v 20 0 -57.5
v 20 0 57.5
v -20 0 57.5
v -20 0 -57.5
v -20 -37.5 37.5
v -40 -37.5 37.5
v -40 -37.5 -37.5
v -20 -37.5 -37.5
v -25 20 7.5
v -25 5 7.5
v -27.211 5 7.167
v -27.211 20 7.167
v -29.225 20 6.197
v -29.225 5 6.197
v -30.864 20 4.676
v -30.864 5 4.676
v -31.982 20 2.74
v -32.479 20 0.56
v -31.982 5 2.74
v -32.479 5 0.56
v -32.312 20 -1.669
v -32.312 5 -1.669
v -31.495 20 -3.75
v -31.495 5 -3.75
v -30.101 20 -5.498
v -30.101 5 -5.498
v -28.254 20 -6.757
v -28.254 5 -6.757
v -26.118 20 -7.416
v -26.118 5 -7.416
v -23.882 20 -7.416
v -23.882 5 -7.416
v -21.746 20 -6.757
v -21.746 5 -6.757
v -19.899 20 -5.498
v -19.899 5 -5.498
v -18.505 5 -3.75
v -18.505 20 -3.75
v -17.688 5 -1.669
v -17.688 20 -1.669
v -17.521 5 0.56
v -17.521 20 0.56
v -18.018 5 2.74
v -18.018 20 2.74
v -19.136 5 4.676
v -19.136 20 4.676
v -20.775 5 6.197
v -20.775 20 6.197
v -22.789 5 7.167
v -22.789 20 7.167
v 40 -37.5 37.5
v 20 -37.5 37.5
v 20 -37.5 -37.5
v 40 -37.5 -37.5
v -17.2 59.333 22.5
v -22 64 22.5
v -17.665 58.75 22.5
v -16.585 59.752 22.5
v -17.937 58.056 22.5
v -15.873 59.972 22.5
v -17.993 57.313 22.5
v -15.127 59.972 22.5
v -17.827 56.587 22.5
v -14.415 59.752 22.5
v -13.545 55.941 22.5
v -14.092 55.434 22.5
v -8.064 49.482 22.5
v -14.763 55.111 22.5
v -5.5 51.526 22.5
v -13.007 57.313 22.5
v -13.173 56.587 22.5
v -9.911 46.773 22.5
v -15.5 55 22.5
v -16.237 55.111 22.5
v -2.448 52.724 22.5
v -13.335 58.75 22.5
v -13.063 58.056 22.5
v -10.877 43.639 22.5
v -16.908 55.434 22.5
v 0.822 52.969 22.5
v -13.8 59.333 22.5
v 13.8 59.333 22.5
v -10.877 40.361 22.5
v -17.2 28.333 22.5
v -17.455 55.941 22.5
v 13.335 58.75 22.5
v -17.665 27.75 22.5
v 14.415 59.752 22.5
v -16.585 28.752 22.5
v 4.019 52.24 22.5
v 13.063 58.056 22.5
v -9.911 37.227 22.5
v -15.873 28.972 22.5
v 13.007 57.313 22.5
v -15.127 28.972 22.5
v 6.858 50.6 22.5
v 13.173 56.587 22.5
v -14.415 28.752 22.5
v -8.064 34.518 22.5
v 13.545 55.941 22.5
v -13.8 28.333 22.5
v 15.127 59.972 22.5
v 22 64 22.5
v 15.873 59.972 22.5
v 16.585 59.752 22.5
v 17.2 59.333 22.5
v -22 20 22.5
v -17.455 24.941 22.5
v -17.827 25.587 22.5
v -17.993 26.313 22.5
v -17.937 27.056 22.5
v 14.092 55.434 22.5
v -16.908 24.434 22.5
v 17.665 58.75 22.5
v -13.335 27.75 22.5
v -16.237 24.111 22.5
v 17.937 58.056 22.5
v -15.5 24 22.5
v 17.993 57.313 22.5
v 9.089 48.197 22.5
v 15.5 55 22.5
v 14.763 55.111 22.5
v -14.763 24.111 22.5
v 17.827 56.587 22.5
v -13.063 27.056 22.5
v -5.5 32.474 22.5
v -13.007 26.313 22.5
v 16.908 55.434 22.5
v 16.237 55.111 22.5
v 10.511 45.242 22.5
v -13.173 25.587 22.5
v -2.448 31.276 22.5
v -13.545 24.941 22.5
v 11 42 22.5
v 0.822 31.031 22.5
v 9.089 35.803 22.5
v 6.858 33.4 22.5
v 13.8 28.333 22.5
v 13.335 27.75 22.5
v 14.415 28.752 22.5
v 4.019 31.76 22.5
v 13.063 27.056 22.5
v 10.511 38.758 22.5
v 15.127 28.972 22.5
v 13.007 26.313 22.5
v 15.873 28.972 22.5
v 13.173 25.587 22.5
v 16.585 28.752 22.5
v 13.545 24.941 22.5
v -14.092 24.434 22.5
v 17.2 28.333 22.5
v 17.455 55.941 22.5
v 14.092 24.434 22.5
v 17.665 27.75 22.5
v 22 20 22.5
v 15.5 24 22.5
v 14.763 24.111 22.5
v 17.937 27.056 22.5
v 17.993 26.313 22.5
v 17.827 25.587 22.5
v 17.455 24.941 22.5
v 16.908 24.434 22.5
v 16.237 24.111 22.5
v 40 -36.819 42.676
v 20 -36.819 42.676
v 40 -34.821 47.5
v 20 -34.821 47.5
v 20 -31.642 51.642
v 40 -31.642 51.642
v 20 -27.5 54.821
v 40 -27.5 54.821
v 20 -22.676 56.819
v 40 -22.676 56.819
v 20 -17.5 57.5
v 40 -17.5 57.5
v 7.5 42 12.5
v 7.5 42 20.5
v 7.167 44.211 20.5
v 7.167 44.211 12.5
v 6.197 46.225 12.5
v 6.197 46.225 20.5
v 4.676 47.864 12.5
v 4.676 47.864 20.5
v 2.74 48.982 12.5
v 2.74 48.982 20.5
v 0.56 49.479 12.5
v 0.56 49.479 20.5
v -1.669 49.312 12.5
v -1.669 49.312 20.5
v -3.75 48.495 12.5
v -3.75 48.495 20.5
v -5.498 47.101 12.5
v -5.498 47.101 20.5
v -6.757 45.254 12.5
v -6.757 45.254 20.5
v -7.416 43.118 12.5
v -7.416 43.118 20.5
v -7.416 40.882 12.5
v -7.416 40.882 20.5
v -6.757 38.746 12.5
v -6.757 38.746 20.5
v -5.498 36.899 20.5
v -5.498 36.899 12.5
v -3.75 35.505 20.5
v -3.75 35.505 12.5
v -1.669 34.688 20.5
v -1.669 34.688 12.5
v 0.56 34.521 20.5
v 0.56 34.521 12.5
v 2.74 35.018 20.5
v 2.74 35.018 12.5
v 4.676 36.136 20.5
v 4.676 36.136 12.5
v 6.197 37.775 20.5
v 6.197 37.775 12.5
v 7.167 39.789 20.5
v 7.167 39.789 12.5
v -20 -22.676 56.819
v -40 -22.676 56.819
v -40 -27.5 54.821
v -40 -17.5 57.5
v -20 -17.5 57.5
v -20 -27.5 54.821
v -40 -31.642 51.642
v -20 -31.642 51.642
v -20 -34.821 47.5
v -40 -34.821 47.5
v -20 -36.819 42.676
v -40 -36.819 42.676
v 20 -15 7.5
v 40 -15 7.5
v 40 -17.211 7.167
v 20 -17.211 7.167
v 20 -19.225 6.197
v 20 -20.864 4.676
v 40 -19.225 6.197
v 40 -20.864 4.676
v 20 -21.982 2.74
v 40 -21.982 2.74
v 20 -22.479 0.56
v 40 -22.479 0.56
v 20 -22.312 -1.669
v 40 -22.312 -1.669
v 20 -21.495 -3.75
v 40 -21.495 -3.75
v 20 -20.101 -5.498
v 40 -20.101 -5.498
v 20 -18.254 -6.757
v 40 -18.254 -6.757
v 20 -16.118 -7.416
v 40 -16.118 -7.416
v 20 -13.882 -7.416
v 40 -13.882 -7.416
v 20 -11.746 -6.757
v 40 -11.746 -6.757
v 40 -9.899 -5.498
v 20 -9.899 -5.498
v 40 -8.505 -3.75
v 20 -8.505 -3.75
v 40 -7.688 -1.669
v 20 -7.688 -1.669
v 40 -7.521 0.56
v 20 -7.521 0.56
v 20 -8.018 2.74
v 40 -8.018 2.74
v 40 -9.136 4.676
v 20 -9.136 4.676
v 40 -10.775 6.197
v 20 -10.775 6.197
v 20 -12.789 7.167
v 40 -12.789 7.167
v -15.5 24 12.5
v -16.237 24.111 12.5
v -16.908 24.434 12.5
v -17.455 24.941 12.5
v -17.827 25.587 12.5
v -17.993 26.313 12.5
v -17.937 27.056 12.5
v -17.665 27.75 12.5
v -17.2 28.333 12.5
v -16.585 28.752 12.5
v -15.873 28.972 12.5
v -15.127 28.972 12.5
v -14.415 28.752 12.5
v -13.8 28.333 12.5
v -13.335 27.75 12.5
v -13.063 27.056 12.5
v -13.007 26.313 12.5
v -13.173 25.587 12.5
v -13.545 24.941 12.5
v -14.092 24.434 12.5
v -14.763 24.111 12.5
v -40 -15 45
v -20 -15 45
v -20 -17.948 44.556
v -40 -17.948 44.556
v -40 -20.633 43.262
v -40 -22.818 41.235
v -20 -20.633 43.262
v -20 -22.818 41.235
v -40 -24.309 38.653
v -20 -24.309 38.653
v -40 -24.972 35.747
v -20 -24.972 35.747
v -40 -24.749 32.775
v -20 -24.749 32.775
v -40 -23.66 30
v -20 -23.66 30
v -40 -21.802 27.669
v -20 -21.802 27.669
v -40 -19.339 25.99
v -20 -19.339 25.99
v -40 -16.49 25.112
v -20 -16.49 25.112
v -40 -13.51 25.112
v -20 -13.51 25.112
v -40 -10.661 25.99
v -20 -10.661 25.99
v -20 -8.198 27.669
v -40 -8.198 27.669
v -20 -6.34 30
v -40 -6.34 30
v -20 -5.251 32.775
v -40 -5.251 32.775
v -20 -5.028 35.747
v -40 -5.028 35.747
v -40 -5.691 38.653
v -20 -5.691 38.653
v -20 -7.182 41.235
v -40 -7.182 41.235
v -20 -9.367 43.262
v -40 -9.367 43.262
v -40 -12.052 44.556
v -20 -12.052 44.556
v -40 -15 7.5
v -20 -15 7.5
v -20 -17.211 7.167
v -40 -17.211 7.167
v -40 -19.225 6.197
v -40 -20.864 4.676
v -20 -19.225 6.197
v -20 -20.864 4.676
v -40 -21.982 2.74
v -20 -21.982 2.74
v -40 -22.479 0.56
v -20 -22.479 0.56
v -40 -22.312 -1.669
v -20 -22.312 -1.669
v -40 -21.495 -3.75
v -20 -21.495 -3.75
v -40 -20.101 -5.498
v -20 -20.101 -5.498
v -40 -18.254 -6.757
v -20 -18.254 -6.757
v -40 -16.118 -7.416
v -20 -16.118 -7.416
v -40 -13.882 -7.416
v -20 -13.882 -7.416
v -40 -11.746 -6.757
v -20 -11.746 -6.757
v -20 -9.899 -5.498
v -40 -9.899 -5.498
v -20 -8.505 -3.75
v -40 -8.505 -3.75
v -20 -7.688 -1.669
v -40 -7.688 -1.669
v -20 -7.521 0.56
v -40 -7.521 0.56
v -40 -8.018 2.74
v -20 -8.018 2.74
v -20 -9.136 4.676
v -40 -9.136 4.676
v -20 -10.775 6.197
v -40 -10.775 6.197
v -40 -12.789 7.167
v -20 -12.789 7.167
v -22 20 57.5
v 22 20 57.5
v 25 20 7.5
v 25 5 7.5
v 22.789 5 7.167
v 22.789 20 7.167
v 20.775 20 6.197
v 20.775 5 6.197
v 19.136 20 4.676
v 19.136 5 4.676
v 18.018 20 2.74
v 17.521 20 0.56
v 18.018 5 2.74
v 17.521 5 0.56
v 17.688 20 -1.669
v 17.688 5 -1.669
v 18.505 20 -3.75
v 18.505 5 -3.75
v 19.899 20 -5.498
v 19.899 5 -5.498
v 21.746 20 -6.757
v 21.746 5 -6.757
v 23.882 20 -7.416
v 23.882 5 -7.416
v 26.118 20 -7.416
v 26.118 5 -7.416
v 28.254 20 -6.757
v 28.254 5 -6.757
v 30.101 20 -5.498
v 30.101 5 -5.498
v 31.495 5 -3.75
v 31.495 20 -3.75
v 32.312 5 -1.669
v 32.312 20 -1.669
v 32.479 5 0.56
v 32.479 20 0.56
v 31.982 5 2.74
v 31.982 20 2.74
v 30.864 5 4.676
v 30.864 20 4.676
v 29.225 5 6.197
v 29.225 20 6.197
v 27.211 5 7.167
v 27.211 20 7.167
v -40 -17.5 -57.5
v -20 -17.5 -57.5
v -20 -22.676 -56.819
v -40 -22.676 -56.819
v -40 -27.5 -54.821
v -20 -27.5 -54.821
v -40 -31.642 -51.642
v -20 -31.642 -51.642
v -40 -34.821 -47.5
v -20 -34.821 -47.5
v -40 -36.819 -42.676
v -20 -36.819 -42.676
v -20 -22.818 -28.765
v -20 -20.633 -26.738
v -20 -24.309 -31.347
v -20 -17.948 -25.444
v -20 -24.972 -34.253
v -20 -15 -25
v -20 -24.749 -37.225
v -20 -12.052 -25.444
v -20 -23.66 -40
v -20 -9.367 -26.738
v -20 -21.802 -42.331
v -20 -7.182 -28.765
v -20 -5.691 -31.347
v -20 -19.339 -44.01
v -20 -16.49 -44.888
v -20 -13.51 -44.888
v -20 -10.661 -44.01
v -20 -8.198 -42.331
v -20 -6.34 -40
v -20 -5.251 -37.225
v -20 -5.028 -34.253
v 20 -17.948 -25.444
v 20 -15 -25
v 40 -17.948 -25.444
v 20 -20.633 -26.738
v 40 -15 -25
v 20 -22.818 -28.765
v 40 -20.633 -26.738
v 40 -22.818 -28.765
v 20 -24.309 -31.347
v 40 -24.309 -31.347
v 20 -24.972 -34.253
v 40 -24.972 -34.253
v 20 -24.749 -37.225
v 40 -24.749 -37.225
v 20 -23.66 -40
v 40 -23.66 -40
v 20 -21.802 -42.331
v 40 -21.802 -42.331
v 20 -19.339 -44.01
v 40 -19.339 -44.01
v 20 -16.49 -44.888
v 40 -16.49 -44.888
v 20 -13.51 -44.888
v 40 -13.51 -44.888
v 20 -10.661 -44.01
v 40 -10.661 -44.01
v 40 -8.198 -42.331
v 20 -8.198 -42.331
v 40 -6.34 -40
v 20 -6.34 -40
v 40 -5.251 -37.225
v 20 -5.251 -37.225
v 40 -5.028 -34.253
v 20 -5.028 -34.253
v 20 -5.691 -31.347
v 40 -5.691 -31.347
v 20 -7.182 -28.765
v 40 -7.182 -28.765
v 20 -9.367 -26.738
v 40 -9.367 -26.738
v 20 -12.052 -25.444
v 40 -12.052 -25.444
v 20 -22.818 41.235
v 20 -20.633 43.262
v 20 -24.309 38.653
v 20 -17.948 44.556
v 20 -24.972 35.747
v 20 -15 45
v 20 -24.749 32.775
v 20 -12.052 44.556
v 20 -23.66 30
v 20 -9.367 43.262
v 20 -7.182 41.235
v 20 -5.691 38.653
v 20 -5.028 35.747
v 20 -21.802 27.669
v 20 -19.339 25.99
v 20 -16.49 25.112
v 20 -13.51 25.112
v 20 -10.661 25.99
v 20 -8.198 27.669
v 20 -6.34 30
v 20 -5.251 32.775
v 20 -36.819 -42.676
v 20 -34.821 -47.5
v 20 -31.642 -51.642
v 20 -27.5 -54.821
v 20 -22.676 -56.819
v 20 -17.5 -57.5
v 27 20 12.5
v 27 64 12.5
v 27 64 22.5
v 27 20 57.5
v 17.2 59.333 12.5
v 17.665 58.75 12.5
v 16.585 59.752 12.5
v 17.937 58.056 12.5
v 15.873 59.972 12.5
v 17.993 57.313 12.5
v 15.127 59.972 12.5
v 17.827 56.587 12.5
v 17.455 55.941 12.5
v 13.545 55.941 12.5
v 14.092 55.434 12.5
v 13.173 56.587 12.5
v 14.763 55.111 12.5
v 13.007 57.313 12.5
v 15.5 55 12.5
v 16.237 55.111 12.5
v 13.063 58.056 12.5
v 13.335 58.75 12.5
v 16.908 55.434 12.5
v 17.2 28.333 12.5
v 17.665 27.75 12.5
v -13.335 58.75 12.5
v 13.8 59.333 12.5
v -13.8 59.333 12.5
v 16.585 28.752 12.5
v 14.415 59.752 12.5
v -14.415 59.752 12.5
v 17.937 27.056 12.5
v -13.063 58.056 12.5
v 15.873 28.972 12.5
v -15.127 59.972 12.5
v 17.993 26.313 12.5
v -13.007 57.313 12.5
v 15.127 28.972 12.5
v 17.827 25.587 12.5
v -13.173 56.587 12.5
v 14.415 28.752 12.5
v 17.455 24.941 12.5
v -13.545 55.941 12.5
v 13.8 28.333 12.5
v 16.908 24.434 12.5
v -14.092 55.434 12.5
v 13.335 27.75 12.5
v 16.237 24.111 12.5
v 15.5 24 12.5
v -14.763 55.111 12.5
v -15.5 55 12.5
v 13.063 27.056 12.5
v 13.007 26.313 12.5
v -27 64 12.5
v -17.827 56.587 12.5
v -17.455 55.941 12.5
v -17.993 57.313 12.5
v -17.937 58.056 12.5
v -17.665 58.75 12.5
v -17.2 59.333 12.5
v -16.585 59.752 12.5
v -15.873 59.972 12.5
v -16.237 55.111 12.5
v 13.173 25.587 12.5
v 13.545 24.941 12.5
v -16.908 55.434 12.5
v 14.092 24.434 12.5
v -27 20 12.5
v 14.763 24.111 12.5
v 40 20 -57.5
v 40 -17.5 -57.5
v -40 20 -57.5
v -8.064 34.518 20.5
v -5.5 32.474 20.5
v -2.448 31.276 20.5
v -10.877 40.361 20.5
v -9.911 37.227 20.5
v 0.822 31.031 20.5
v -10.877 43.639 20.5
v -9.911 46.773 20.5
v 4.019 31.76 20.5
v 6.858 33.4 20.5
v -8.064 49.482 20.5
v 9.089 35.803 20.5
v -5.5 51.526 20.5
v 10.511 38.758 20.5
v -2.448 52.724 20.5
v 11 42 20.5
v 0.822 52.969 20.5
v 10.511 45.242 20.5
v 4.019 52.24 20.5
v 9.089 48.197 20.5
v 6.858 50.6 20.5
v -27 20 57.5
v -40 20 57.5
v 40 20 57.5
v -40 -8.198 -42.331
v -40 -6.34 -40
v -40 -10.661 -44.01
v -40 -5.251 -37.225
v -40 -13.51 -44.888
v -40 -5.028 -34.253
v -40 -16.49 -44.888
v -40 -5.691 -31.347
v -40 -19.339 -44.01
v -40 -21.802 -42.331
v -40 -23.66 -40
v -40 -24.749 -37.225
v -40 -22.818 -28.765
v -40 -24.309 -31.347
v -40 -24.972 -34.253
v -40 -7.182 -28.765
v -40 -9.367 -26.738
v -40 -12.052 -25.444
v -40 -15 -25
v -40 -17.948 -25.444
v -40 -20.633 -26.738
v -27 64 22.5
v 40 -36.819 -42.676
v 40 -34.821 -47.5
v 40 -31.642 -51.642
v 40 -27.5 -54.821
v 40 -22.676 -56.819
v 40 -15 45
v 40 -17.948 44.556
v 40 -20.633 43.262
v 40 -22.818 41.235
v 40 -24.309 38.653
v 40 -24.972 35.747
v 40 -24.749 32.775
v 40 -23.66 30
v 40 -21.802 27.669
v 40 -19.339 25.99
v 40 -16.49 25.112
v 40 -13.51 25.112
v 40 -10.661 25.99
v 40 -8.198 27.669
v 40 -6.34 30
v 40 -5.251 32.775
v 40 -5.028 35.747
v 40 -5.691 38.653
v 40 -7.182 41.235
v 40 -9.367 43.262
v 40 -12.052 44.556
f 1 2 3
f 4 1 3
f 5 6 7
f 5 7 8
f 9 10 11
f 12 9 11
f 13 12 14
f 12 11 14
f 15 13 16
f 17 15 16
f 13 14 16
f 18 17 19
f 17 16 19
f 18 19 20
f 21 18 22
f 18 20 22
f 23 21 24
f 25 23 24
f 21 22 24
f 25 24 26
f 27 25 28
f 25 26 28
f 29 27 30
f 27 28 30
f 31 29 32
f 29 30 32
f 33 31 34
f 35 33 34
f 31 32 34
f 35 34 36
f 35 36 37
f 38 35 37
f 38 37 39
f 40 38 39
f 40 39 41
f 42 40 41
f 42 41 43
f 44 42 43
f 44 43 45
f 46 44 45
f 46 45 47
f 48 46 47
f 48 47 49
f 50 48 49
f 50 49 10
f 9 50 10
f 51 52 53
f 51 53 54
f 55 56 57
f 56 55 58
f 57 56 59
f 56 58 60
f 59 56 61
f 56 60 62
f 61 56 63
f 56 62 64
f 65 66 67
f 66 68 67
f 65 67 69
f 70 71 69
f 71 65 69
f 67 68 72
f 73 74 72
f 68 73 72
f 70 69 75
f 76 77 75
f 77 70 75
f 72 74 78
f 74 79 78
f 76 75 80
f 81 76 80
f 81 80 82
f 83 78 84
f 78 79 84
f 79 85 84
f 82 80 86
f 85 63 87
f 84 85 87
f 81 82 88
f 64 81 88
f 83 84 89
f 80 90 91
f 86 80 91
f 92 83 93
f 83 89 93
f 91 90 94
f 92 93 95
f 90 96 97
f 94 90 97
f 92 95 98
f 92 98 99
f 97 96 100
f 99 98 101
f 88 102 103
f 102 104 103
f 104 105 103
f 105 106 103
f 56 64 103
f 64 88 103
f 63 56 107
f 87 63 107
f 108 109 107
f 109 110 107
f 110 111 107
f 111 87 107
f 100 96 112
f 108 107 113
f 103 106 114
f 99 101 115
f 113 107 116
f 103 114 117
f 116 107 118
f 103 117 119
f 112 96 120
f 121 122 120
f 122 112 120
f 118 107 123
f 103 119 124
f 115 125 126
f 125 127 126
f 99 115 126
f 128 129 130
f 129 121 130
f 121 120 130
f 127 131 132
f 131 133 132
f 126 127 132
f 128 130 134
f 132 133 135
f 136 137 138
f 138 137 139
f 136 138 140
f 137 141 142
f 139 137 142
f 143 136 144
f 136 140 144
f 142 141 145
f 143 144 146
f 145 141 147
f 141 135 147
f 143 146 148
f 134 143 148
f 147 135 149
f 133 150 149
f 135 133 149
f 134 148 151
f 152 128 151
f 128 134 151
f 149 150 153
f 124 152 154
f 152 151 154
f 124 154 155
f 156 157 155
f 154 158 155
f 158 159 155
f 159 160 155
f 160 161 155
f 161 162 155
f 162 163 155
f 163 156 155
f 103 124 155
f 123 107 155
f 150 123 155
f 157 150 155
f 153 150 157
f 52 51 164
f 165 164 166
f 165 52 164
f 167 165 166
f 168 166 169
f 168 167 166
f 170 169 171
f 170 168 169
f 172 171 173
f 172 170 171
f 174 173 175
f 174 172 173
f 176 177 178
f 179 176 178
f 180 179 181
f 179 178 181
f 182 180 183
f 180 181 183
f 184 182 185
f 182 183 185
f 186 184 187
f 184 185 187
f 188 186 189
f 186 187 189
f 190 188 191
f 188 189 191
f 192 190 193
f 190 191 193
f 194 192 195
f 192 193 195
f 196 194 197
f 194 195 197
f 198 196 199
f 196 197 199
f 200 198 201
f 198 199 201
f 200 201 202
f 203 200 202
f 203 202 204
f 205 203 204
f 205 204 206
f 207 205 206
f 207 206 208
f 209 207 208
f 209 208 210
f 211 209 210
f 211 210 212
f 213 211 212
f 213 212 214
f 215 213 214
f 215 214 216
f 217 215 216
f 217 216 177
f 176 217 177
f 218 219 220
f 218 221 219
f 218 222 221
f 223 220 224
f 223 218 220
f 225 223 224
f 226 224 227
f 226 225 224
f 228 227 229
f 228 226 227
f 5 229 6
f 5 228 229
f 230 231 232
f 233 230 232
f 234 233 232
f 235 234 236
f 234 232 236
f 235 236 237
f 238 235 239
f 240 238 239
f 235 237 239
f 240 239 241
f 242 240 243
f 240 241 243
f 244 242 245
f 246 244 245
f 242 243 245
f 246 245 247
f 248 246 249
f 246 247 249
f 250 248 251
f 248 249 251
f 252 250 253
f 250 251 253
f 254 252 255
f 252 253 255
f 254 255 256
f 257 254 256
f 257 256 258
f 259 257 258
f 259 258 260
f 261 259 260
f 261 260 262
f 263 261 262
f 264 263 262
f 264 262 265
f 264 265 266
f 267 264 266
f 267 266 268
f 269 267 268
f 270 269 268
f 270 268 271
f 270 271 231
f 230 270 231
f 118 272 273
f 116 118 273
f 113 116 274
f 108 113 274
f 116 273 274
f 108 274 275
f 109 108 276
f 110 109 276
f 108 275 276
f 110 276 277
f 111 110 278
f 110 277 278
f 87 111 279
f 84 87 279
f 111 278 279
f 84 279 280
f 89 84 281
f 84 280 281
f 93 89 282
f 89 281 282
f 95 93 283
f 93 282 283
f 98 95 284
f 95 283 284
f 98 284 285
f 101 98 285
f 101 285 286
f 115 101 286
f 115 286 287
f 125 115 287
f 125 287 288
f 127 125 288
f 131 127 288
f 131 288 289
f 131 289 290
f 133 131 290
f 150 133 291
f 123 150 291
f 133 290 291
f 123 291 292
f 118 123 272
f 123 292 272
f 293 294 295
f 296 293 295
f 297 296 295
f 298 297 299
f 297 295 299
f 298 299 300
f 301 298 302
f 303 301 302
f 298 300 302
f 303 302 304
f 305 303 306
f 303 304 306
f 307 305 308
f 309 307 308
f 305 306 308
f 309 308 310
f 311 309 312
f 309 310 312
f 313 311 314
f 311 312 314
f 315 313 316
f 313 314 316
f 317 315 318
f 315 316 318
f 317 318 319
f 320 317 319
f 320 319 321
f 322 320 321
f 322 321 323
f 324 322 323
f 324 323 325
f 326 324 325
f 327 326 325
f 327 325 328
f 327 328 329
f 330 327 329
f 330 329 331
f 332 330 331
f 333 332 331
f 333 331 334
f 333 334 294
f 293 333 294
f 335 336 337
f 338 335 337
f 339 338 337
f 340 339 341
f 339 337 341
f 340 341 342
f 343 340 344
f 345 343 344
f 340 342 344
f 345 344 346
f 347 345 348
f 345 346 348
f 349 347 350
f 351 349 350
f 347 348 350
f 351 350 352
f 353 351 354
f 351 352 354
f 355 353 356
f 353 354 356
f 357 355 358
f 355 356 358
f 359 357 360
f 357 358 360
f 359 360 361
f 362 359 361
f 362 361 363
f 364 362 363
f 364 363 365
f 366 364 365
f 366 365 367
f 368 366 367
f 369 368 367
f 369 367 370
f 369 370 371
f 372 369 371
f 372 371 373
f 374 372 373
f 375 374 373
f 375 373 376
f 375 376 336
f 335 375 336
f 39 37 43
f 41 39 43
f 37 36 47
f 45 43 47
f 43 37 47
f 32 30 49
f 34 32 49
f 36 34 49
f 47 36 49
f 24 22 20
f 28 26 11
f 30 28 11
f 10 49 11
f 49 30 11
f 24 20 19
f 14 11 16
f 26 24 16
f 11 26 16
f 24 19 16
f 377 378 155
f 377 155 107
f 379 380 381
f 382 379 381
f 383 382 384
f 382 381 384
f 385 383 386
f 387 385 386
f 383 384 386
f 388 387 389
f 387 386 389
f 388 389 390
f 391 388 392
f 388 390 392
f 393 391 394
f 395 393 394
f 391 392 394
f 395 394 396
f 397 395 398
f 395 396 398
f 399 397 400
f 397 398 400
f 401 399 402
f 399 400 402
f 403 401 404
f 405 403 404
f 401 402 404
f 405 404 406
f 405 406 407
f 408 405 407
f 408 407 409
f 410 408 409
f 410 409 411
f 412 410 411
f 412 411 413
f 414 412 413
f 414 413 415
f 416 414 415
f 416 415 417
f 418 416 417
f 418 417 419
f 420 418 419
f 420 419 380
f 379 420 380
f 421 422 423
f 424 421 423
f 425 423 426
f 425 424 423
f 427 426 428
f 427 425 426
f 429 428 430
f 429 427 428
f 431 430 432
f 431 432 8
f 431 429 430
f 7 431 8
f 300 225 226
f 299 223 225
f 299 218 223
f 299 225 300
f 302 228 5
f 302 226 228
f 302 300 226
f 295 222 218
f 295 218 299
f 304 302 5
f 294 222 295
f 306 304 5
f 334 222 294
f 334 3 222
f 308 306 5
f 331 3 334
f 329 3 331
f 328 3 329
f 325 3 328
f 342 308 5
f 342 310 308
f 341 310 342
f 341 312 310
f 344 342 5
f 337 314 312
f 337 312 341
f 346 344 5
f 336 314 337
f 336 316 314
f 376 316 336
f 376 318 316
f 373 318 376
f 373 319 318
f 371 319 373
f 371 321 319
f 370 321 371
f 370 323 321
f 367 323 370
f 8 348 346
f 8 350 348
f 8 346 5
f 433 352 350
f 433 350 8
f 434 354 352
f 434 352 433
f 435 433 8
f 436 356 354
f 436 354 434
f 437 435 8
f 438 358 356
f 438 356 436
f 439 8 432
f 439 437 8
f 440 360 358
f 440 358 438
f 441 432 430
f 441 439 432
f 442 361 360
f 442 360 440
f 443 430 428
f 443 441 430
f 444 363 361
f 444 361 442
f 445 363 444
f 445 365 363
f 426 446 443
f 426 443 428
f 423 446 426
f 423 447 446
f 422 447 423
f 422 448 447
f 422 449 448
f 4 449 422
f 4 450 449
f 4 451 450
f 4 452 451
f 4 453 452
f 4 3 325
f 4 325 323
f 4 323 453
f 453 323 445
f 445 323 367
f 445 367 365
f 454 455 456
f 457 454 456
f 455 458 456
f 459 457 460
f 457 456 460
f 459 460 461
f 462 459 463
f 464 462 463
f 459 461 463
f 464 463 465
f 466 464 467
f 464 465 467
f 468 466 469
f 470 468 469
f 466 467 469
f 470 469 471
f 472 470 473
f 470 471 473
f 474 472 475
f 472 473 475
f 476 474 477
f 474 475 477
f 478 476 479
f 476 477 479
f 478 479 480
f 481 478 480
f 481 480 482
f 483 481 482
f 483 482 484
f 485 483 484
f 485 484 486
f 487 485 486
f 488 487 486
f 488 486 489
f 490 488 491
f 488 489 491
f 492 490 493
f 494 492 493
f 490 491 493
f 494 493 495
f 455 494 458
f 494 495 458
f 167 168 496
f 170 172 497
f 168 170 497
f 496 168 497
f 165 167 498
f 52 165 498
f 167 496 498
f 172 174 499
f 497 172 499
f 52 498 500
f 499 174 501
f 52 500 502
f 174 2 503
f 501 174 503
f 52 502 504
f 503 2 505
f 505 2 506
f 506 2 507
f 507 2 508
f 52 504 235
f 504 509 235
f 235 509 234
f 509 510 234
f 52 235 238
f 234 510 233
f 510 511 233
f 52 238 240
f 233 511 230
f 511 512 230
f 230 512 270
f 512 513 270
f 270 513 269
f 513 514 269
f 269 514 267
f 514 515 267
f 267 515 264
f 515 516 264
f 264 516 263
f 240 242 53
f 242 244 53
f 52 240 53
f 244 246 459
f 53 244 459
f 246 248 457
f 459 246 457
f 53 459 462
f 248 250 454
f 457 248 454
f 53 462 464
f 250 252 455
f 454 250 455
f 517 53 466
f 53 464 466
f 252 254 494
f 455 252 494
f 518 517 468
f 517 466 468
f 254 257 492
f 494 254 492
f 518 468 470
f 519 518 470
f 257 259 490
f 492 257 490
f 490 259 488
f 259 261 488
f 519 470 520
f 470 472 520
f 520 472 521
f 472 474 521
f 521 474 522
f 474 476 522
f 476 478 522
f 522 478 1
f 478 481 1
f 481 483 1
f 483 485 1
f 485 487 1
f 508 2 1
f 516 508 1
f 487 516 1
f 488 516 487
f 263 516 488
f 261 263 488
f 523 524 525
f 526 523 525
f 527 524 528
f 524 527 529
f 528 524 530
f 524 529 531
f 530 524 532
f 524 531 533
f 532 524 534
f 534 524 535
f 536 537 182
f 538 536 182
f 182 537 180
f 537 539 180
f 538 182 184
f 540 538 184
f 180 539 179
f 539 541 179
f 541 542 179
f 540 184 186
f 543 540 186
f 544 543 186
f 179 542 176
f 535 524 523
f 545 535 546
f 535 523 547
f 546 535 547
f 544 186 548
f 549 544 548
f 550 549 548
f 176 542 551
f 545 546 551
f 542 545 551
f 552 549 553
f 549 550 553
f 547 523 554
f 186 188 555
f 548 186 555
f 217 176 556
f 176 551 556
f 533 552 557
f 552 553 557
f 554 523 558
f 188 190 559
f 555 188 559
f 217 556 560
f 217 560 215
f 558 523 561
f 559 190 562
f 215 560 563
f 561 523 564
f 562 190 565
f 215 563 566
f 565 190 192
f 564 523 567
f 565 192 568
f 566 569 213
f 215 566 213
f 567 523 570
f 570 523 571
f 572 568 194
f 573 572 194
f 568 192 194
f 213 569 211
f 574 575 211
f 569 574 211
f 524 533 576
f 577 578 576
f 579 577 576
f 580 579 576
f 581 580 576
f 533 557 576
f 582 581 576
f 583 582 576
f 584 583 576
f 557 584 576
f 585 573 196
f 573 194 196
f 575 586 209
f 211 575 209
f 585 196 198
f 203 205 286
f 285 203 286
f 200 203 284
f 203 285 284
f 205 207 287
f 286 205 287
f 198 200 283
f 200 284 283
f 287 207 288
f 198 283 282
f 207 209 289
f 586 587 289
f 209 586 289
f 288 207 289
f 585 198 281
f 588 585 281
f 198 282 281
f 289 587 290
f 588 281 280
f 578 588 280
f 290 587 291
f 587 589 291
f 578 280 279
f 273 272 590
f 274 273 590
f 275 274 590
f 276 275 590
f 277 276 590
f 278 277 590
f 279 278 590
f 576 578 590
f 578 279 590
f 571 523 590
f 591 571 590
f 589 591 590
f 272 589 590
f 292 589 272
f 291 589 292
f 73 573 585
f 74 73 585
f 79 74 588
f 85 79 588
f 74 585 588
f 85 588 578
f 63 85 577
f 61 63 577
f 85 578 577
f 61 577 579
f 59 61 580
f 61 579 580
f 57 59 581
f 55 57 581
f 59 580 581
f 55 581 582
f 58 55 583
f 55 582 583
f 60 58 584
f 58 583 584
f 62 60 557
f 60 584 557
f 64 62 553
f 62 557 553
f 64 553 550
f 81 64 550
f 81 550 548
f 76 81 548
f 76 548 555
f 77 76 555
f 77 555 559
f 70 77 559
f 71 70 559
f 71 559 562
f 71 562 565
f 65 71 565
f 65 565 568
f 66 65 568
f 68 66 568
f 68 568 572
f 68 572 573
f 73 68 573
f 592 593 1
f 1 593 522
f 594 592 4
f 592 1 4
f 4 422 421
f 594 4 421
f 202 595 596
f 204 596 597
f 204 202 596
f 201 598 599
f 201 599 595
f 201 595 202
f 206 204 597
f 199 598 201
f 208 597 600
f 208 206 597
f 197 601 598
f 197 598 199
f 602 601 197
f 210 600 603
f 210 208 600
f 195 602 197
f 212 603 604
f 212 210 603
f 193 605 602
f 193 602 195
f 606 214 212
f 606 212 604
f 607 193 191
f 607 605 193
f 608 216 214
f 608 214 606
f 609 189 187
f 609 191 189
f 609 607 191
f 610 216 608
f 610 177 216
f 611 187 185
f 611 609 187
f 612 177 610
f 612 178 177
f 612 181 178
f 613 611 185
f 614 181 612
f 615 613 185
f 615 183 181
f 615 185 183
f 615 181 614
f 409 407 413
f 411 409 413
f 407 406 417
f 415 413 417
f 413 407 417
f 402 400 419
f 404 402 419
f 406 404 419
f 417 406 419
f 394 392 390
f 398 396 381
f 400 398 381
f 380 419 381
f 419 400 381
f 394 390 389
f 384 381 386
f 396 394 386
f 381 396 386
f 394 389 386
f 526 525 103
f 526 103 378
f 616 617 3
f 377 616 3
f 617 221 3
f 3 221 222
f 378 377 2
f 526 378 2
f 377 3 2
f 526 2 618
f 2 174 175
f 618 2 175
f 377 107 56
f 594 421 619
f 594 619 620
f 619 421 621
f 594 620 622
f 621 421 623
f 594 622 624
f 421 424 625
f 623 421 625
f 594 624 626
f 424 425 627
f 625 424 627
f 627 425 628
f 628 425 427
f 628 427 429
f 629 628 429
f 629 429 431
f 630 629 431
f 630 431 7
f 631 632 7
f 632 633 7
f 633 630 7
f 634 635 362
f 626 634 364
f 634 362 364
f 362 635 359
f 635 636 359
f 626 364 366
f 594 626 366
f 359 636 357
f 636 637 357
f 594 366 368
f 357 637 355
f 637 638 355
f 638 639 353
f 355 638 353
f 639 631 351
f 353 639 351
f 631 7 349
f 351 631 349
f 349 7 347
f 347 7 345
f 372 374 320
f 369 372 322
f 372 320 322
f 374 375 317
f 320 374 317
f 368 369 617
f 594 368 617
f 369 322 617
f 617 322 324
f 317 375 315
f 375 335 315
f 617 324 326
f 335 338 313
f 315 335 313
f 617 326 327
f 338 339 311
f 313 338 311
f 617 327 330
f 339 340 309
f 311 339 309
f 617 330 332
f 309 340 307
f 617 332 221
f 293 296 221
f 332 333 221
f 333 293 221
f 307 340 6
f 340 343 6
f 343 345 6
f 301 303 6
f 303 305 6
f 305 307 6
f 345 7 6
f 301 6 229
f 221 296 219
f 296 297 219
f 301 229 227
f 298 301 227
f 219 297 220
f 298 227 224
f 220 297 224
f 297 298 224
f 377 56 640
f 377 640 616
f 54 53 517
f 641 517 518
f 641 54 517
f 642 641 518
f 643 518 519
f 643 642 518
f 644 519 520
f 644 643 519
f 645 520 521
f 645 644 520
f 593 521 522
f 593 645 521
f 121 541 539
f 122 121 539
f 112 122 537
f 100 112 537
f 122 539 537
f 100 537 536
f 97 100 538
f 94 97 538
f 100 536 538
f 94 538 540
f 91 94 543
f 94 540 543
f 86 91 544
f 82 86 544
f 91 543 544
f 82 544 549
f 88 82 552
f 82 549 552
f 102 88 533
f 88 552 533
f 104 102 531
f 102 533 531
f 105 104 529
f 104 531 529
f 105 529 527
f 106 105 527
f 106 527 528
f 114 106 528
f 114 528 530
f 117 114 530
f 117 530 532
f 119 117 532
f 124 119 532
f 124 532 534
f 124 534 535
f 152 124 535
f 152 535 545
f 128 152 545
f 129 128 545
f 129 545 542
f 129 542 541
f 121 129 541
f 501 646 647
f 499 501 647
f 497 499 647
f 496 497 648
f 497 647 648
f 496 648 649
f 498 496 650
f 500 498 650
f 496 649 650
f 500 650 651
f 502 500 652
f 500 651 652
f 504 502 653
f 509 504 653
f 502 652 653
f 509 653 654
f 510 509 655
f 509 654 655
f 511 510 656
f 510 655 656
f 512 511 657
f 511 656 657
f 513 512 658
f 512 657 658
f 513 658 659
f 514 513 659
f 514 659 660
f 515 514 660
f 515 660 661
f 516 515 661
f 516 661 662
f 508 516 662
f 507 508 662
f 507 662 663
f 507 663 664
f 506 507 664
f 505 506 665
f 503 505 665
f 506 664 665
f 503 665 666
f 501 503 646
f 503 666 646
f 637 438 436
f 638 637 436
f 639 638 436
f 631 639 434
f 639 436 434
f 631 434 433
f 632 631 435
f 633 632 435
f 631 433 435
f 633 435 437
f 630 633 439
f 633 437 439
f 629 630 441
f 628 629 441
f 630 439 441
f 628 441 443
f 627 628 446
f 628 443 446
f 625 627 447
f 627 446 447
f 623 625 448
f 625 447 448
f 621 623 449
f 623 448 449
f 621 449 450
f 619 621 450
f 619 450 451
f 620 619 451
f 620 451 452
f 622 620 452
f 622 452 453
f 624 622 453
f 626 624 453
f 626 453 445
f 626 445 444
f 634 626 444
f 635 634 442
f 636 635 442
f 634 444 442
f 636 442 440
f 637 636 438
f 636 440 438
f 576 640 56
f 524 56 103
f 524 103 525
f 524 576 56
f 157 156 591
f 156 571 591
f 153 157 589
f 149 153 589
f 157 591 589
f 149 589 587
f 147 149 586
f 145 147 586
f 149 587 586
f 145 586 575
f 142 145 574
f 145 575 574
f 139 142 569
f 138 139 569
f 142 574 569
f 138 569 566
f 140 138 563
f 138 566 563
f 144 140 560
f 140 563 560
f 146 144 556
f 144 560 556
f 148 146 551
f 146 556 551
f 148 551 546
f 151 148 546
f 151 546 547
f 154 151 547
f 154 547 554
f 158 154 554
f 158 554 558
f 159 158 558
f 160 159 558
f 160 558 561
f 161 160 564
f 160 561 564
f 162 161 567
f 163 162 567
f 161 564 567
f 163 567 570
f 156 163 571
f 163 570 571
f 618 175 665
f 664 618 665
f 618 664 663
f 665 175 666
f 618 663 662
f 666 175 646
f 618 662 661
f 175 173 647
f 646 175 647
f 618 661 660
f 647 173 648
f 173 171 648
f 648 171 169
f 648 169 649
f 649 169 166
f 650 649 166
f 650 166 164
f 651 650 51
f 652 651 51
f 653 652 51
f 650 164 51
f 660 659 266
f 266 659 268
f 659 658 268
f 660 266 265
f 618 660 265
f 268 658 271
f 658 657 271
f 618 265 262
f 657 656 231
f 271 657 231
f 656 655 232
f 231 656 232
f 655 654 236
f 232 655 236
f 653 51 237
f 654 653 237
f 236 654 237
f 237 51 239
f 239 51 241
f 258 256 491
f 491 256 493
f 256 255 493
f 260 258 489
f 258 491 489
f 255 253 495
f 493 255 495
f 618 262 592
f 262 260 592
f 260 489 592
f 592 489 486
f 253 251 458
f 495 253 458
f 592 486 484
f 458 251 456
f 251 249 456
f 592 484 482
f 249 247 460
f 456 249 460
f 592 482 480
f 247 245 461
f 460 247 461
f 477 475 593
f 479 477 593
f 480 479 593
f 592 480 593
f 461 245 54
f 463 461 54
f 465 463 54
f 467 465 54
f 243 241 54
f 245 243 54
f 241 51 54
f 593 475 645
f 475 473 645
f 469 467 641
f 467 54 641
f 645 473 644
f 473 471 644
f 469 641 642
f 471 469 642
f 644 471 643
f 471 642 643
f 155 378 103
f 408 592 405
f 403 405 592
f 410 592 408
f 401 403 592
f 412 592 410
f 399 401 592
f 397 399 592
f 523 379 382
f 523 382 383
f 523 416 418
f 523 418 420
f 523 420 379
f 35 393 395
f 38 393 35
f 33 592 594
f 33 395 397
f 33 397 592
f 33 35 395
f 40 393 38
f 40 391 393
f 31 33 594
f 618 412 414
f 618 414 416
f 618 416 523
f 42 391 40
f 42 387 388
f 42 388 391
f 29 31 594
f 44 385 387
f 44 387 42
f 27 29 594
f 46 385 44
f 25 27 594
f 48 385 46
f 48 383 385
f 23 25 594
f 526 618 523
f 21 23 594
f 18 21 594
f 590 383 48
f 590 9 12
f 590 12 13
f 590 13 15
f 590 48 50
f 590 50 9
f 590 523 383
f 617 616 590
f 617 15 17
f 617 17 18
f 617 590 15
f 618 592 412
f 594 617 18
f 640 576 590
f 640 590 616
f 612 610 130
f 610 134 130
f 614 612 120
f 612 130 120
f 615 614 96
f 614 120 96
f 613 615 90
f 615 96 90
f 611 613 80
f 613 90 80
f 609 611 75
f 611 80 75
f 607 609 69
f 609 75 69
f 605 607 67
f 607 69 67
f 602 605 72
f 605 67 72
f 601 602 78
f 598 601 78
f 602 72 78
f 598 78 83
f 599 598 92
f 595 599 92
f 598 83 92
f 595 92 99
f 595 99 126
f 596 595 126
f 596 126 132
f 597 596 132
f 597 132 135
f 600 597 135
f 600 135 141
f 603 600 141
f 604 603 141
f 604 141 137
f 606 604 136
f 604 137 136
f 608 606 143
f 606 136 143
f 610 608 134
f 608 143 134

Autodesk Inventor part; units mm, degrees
ref_plane "YZ Plane" through (0, 0, 0) normal (1, 0, 0) x (0, 1, 0)
ref_plane "XZ Plane" through (0, 0, 0) normal (0, 1, 0) x (-1, 0, 0)
ref_plane "XY Plane" through (0, 0, 0) normal (0, 0, 1) x (1, 0, 0)
sketch "Sketch1" plane through (0, 0, 0) normal (0, 1, 0) x (-1, 0, 0)
  line L0 (40, 57.5) -> (-40, 57.5)
  line L1 (-40, 57.5) -> (-40, -57.5)
  line L2 (-40, -57.5) -> (40, -57.5)
  line L3 (40, -57.5) -> (40, 57.5)
  point P0 (0, 0)
  point P1 (40, 0)
  point P2 (0, 57.5)
  dimension "d0" = 115
  dimension "d1" = 80
extrude "Extrusion1" add sketch "Sketch1" along normal blind 20
sketch "Sketch12" plane through (0, 0, 0) normal (0, -1, 0) x (1, 0, 0)
  line L0 (-40, 57.5) -> (-20, 57.5)
  line L1 (-20, 57.5) -> (-20, -57.5)
  line L2 (-20, -57.5) -> (-40, -57.5)
  line L3 (-40, -57.5) -> (-40, 57.5)
  line L4 (-40, -57.5) -> (-40, 57.5) projected
  line L5 (0, 100.8809) -> (0, -116.5773) construction
  line L6 (40, 57.5) -> (20, 57.5)
  line L7 (20, 57.5) -> (20, -57.5)
  line L8 (20, -57.5) -> (40, -57.5)
  line L9 (40, -57.5) -> (40, 57.5)
  point P0 (0, 0)
  point P1 (-40, 0)
  point P2 (0, 0)
  point P3 (-20, 0)
  dimension "d56" = 20
  dimension "d57" = 115
extrude "Extrusion11" add sketch "Sketch12" along normal blind 37.5
sketch "Sketch13" plane through (-40, 0, 57.5) normal (-1, 0, 0) x (0, 0, 1)
  line L0 (0, 0) -> (-115, 0) projected
  point P0 (-57.5, 0)
  point P1 (-22.5, -15)
  point P2 (-92.5, -15)
  point P3 (-57.5, -15)
  point P4 (-57.5, 0)
  dimension "d129" = 35
  dimension "d130" = 35
  dimension "d131" = 15
hole "Hole2" at (-40, -15, 35) at (-40, -15, -35) direction (1, 0, 0) diameter 20 end through all
hole "Hole3" at (-40, -15, 0) direction (1, 0, 0) diameter 15 end through all
sketch "Sketch19" plane through (0, 20, 0) normal (0, 1, 0) x (1, 0, 0)
  point P0 (0, 0)
  point P1 (25, 0)
  point P2 (-25, 0)
  dimension "d111" = 25
  dimension "d112" = 25
hole "Hole6" at (25, 20, 0) at (-25, 20, 0) direction (0, -1, 0) diameter 15 depth 15
fillet "Fillet19" radius 20 4 edges at (-30, -37.5, -57.5) (30, -37.5, -57.5) (30, -37.5, 57.5) (-30, -37.5, 57.5)
sketch "Sketch20" plane through (0, 20, 0) normal (0, 1, 0) x (1, 0, 0)
  line L0 (-27, -22.5) -> (27, -22.5)
  line L1 (27, -22.5) -> (27, -12.5)
  line L2 (27, -12.5) -> (-27, -12.5)
  line L3 (-27, -12.5) -> (-27, -22.5)
  line L4 (-40, 57.5) -> (-40, -57.5) projected
  line L5 (40, -57.5) -> (40, 57.5) projected
  line L6 (-40, -57.5) -> (40, -57.5) projected
  point P0 (0, 0)
  point P1 (0, -12.5)
  dimension "d122" = 10
  dimension "d151" = 45
  dimension "d152" = 54
extrude "Extrusion15" add sketch "Sketch20" along normal blind 44
sketch "Sketch21" plane through (-40, 20, 22.5) normal (0, 0, 1) x (1, 0, 0)
  circle A0 centre (40, 22) radius 7.5
  line L0 (20, -20) -> (60, -20) projected
  line L1 (13, 44) -> (67, 44) projected
  circle A1 centre (40, 22) radius 11
  point P0 (40, -20)
  point P1 (40, -20)
  point P2 (0, -20)
  point P3 (80, -20)
  point P4 (24.5, 37.5)
  point P5 (24.5, 6.5)
  point P6 (55.5, 6.5)
  point P7 (55.5, 37.5)
  dimension "d128" = 15
  dimension "d132" = 22
  dimension "d134" = 15.5
  dimension "d135" = 15.5
  dimension "d138" = 360
  dimension "d147" = 22
extrude "Extrusion16" cut sketch "Sketch21" against normal blind 50 contours A0
hole "Hole7" at (-15.5, 57.5, 22.5) at (-15.5, 26.5, 22.5) at (15.5, 26.5, 22.5) at (15.5, 57.5, 22.5) direction (0, 0, -1) diameter 5 depth 15
extrude "Extrusion17" cut sketch "Sketch21" against normal blind 2
sketch "Sketch24" plane through (0, 20, 0) normal (0, 1, 0) x (1, 0, 0)
  line L0 (-27, -22.5) -> (-22, -22.5)
  line L1 (-22, -22.5) -> (-22, -57.5)
  line L2 (-22, -57.5) -> (-27, -57.5)
  line L3 (-27, -57.5) -> (-27, -22.5)
  line L4 (-27, -22.5) -> (-27, -12.5) projected
  line L5 (27, -22.5) -> (-27, -22.5) projected
  line L6 (-40, -57.5) -> (40, -57.5) projected
  line L7 (22, -22.5) -> (27, -22.5)
  line L8 (27, -22.5) -> (27, -57.5)
  line L9 (27, -57.5) -> (22, -57.5)
  line L10 (22, -57.5) -> (22, -22.5)
  line L11 (27, -12.5) -> (27, -22.5) projected
  point P0 (0, 0)
  dimension "d155" = 5
  dimension "d156" = 5
extrude "Extrusion18" add sketch "Sketch24" along normal blind 44 contours L0 L1 L2 L3 | L5 L8 L6 L10
sketch "Sketch25" plane through (27, 20, 57.5) normal (1, 0, 0) x (0, 0, -1)
  line L0 (35, 44) -> (0, 0)
  line L1 (0, 44) -> (35, 44)
  line L2 (0, 44) -> (0, 0)
  line L3 (45, 0) -> (45, 44) projected
  point P0 (57.5, -20)
  dimension "d161" = 10
extrude "Extrusion19" cut sketch "Sketch25" against normal blind 100
properties part number "Y_Slider_Part_mit_Schrittmotor"
